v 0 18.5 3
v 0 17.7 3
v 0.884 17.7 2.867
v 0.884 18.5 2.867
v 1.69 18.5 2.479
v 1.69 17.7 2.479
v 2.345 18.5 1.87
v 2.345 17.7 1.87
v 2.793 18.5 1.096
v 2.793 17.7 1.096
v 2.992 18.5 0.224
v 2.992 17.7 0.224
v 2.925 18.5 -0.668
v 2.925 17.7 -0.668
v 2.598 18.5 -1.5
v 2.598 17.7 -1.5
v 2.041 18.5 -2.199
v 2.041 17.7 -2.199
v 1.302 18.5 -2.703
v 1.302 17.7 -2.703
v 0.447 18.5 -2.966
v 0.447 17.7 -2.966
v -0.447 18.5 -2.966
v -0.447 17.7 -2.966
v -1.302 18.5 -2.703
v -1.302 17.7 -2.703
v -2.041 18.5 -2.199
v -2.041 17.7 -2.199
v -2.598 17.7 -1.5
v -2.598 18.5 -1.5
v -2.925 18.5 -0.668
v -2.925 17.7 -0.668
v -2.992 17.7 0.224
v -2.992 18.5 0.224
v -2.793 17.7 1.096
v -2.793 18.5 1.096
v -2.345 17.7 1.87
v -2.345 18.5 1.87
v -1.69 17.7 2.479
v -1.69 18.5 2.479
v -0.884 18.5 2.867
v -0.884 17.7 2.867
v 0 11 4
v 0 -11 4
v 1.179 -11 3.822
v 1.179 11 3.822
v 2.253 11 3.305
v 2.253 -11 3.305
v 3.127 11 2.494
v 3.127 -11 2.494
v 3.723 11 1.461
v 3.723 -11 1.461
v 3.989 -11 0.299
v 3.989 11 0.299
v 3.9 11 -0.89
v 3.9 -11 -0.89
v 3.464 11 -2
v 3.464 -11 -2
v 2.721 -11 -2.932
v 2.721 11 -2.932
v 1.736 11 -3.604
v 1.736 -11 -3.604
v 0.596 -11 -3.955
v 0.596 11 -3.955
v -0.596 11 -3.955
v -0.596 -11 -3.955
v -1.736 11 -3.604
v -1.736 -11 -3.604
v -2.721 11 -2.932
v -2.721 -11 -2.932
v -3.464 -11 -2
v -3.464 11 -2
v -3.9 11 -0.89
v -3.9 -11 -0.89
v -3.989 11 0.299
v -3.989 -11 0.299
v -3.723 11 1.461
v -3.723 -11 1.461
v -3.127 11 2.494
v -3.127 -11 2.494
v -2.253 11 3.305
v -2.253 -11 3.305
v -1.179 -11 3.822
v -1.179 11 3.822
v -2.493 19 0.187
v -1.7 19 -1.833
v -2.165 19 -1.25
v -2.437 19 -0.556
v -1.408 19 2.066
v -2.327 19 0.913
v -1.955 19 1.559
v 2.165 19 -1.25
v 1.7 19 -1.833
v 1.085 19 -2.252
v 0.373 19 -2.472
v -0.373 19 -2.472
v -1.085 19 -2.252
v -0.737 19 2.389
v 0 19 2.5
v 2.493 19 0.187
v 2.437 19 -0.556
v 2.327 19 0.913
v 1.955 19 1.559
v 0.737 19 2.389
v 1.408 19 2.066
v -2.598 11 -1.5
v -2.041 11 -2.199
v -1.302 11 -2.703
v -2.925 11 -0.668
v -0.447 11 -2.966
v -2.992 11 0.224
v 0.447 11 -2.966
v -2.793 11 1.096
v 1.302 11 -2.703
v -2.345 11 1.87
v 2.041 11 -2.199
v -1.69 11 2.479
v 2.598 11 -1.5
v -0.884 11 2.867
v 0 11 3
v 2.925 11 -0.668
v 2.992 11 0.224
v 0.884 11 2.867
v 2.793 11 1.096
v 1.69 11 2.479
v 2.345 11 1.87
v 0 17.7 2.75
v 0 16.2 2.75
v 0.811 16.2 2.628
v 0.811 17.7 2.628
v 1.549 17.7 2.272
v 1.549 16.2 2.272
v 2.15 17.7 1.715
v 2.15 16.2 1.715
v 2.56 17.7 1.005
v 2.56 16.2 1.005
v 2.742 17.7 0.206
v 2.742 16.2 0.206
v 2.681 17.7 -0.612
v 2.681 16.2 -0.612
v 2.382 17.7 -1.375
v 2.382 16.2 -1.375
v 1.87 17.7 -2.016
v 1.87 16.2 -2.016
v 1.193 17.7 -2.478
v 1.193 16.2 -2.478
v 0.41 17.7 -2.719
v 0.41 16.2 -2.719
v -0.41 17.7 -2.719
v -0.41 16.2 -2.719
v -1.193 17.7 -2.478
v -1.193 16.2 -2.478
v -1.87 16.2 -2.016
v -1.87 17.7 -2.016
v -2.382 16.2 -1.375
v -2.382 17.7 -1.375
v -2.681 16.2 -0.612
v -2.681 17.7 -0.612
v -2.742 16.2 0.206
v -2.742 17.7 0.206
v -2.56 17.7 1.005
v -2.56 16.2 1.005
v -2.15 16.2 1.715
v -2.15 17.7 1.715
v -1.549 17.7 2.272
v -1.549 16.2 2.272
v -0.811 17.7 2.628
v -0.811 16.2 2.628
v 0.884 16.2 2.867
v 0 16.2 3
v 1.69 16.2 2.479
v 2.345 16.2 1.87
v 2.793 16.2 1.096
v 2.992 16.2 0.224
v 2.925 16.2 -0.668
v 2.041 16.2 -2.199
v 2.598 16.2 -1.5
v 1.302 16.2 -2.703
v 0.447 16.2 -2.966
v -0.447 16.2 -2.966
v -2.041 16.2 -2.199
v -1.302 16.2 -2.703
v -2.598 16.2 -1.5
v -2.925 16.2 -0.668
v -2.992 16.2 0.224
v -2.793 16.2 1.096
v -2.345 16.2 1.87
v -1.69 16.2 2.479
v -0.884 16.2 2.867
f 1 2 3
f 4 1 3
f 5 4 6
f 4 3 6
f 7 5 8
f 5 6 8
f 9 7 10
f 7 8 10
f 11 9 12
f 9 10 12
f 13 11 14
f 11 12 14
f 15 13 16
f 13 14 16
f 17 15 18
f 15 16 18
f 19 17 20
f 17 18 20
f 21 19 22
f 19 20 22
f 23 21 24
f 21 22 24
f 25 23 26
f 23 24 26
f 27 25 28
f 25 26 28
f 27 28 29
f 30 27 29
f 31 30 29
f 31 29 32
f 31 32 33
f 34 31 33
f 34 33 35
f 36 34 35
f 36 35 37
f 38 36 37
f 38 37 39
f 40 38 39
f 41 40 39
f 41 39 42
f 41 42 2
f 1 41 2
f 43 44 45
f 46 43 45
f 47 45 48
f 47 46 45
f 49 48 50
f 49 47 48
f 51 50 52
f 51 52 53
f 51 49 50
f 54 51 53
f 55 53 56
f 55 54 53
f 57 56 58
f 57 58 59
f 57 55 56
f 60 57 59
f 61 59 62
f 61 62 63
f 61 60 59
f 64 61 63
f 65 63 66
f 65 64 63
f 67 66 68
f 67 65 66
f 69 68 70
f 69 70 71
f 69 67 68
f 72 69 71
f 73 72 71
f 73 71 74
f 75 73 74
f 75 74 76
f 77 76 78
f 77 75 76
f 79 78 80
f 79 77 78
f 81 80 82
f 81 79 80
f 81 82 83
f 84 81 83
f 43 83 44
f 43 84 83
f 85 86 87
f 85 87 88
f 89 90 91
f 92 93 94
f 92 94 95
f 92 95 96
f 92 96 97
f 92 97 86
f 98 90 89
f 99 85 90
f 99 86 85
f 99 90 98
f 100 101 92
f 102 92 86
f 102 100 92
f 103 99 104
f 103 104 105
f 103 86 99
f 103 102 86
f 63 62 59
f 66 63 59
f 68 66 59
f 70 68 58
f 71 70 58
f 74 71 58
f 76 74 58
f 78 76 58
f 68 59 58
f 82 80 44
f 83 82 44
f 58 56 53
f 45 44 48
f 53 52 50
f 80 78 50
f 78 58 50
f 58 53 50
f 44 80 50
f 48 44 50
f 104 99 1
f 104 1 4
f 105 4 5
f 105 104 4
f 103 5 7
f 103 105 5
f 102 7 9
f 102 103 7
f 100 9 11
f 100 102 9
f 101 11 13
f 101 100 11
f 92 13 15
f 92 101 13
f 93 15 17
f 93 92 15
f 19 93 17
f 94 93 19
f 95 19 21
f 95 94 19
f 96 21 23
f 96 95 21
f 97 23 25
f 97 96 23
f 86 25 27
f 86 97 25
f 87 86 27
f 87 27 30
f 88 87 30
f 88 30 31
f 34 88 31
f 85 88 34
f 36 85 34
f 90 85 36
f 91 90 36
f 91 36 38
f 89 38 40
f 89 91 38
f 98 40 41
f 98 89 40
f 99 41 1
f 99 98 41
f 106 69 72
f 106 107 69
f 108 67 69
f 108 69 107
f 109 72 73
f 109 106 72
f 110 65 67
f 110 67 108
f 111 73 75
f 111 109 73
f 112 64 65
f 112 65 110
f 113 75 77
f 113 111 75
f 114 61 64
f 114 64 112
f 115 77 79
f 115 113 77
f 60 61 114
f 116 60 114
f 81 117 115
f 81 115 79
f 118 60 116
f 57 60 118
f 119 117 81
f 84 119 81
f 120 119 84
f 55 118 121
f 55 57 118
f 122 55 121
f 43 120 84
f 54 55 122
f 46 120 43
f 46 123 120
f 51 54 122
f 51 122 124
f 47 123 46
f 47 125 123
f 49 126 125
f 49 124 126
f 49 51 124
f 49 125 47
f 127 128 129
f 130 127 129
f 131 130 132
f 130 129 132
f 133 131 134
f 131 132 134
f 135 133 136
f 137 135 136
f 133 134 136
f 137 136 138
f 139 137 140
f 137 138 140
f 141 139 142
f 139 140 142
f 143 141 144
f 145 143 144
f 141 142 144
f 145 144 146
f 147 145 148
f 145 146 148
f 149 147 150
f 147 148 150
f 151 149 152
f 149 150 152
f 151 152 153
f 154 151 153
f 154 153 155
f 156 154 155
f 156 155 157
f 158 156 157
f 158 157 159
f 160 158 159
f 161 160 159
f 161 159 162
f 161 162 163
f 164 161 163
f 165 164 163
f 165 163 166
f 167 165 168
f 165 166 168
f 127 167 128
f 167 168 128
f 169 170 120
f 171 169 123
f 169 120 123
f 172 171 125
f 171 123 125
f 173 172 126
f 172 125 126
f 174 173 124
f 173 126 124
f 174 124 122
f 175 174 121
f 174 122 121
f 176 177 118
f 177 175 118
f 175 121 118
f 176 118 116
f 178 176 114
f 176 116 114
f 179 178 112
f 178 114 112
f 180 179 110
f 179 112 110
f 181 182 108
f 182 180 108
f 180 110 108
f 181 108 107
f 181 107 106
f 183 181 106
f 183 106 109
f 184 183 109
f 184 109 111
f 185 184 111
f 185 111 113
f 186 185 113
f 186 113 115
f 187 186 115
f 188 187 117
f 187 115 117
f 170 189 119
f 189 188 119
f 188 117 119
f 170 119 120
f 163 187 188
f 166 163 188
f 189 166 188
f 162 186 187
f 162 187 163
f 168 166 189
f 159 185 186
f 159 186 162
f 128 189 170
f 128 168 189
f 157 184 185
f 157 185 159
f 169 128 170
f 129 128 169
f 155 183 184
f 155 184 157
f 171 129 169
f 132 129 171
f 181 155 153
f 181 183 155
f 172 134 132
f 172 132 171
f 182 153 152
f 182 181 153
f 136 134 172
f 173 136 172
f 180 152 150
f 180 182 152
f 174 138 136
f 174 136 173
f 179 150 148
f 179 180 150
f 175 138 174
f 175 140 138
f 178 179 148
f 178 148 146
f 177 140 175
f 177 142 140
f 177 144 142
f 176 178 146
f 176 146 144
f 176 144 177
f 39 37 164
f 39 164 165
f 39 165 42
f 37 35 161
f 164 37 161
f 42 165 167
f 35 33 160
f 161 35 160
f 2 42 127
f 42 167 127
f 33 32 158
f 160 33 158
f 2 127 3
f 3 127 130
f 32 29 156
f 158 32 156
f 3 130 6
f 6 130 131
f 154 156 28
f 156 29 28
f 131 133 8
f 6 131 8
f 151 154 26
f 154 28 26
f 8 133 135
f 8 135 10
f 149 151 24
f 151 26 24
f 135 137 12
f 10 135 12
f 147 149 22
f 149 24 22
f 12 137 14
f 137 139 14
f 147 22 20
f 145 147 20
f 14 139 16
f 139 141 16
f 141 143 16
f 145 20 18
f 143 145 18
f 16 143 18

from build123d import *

# Parameters (mm, degrees)
SKETCH_1_R          = 4
EXTRUDE_1_DEPTH     = 11
SKETCH_2_R          = 3
EXTRUDE_2_DEPTH     = 8
CUT_EXTRUDE_START   = 5.2
SKETCH_3_OUTSIDE_W  = 16.412
SKETCH_3_OUTSIDE_H  = 16.412
SKETCH_3_OUTSIDE_R  = 2.75
CUT_EXTRUDE_1_DEPTH = 1.5
CHAMFER_1_SIZE      = 0.5


with BuildPart() as part:
    # 草图1 → 凸台-拉伸1 (new, symmetric)
    with BuildSketch(Plane(origin=(0, 0, 0), x_dir=(1, 0, 0), z_dir=(0, 1, 0))):
        with Locations(Location((0, 0, 0), (0, 0, 270))):
            Circle(SKETCH_1_R)
    extrude(amount=EXTRUDE_1_DEPTH, both=True)

    # 草图2 → 凸台-拉伸2 (add)
    with BuildSketch(Plane(origin=(0, 11, 0), x_dir=(1, 0, 0), z_dir=(0, 1, 0))):
        with Locations(Location((0, 0, 0), (0, 0, 270))):
            Circle(SKETCH_2_R)
    extrude(amount=EXTRUDE_2_DEPTH)

    # 草图3 outside → 切除-拉伸1 (cut)
    with BuildSketch(Plane(origin=(0, 11, 0), x_dir=(1, 0, 0), z_dir=(0, 1, 0)).offset(CUT_EXTRUDE_START)):
        Rectangle(SKETCH_3_OUTSIDE_W, SKETCH_3_OUTSIDE_H)
        with Locations(Location((0, 0, 0), (0, 0, 270))):
            Circle(SKETCH_3_OUTSIDE_R, mode=Mode.SUBTRACT)
    extrude(amount=CUT_EXTRUDE_1_DEPTH, mode=Mode.SUBTRACT)

    # 倒角1
    chamfer_1_edges = [part.edges().sort_by_distance(p)[0] for p in [
        (0, 19, -3),
    ]]
    chamfer(chamfer_1_edges, length=CHAMFER_1_SIZE)


solid = part.part
